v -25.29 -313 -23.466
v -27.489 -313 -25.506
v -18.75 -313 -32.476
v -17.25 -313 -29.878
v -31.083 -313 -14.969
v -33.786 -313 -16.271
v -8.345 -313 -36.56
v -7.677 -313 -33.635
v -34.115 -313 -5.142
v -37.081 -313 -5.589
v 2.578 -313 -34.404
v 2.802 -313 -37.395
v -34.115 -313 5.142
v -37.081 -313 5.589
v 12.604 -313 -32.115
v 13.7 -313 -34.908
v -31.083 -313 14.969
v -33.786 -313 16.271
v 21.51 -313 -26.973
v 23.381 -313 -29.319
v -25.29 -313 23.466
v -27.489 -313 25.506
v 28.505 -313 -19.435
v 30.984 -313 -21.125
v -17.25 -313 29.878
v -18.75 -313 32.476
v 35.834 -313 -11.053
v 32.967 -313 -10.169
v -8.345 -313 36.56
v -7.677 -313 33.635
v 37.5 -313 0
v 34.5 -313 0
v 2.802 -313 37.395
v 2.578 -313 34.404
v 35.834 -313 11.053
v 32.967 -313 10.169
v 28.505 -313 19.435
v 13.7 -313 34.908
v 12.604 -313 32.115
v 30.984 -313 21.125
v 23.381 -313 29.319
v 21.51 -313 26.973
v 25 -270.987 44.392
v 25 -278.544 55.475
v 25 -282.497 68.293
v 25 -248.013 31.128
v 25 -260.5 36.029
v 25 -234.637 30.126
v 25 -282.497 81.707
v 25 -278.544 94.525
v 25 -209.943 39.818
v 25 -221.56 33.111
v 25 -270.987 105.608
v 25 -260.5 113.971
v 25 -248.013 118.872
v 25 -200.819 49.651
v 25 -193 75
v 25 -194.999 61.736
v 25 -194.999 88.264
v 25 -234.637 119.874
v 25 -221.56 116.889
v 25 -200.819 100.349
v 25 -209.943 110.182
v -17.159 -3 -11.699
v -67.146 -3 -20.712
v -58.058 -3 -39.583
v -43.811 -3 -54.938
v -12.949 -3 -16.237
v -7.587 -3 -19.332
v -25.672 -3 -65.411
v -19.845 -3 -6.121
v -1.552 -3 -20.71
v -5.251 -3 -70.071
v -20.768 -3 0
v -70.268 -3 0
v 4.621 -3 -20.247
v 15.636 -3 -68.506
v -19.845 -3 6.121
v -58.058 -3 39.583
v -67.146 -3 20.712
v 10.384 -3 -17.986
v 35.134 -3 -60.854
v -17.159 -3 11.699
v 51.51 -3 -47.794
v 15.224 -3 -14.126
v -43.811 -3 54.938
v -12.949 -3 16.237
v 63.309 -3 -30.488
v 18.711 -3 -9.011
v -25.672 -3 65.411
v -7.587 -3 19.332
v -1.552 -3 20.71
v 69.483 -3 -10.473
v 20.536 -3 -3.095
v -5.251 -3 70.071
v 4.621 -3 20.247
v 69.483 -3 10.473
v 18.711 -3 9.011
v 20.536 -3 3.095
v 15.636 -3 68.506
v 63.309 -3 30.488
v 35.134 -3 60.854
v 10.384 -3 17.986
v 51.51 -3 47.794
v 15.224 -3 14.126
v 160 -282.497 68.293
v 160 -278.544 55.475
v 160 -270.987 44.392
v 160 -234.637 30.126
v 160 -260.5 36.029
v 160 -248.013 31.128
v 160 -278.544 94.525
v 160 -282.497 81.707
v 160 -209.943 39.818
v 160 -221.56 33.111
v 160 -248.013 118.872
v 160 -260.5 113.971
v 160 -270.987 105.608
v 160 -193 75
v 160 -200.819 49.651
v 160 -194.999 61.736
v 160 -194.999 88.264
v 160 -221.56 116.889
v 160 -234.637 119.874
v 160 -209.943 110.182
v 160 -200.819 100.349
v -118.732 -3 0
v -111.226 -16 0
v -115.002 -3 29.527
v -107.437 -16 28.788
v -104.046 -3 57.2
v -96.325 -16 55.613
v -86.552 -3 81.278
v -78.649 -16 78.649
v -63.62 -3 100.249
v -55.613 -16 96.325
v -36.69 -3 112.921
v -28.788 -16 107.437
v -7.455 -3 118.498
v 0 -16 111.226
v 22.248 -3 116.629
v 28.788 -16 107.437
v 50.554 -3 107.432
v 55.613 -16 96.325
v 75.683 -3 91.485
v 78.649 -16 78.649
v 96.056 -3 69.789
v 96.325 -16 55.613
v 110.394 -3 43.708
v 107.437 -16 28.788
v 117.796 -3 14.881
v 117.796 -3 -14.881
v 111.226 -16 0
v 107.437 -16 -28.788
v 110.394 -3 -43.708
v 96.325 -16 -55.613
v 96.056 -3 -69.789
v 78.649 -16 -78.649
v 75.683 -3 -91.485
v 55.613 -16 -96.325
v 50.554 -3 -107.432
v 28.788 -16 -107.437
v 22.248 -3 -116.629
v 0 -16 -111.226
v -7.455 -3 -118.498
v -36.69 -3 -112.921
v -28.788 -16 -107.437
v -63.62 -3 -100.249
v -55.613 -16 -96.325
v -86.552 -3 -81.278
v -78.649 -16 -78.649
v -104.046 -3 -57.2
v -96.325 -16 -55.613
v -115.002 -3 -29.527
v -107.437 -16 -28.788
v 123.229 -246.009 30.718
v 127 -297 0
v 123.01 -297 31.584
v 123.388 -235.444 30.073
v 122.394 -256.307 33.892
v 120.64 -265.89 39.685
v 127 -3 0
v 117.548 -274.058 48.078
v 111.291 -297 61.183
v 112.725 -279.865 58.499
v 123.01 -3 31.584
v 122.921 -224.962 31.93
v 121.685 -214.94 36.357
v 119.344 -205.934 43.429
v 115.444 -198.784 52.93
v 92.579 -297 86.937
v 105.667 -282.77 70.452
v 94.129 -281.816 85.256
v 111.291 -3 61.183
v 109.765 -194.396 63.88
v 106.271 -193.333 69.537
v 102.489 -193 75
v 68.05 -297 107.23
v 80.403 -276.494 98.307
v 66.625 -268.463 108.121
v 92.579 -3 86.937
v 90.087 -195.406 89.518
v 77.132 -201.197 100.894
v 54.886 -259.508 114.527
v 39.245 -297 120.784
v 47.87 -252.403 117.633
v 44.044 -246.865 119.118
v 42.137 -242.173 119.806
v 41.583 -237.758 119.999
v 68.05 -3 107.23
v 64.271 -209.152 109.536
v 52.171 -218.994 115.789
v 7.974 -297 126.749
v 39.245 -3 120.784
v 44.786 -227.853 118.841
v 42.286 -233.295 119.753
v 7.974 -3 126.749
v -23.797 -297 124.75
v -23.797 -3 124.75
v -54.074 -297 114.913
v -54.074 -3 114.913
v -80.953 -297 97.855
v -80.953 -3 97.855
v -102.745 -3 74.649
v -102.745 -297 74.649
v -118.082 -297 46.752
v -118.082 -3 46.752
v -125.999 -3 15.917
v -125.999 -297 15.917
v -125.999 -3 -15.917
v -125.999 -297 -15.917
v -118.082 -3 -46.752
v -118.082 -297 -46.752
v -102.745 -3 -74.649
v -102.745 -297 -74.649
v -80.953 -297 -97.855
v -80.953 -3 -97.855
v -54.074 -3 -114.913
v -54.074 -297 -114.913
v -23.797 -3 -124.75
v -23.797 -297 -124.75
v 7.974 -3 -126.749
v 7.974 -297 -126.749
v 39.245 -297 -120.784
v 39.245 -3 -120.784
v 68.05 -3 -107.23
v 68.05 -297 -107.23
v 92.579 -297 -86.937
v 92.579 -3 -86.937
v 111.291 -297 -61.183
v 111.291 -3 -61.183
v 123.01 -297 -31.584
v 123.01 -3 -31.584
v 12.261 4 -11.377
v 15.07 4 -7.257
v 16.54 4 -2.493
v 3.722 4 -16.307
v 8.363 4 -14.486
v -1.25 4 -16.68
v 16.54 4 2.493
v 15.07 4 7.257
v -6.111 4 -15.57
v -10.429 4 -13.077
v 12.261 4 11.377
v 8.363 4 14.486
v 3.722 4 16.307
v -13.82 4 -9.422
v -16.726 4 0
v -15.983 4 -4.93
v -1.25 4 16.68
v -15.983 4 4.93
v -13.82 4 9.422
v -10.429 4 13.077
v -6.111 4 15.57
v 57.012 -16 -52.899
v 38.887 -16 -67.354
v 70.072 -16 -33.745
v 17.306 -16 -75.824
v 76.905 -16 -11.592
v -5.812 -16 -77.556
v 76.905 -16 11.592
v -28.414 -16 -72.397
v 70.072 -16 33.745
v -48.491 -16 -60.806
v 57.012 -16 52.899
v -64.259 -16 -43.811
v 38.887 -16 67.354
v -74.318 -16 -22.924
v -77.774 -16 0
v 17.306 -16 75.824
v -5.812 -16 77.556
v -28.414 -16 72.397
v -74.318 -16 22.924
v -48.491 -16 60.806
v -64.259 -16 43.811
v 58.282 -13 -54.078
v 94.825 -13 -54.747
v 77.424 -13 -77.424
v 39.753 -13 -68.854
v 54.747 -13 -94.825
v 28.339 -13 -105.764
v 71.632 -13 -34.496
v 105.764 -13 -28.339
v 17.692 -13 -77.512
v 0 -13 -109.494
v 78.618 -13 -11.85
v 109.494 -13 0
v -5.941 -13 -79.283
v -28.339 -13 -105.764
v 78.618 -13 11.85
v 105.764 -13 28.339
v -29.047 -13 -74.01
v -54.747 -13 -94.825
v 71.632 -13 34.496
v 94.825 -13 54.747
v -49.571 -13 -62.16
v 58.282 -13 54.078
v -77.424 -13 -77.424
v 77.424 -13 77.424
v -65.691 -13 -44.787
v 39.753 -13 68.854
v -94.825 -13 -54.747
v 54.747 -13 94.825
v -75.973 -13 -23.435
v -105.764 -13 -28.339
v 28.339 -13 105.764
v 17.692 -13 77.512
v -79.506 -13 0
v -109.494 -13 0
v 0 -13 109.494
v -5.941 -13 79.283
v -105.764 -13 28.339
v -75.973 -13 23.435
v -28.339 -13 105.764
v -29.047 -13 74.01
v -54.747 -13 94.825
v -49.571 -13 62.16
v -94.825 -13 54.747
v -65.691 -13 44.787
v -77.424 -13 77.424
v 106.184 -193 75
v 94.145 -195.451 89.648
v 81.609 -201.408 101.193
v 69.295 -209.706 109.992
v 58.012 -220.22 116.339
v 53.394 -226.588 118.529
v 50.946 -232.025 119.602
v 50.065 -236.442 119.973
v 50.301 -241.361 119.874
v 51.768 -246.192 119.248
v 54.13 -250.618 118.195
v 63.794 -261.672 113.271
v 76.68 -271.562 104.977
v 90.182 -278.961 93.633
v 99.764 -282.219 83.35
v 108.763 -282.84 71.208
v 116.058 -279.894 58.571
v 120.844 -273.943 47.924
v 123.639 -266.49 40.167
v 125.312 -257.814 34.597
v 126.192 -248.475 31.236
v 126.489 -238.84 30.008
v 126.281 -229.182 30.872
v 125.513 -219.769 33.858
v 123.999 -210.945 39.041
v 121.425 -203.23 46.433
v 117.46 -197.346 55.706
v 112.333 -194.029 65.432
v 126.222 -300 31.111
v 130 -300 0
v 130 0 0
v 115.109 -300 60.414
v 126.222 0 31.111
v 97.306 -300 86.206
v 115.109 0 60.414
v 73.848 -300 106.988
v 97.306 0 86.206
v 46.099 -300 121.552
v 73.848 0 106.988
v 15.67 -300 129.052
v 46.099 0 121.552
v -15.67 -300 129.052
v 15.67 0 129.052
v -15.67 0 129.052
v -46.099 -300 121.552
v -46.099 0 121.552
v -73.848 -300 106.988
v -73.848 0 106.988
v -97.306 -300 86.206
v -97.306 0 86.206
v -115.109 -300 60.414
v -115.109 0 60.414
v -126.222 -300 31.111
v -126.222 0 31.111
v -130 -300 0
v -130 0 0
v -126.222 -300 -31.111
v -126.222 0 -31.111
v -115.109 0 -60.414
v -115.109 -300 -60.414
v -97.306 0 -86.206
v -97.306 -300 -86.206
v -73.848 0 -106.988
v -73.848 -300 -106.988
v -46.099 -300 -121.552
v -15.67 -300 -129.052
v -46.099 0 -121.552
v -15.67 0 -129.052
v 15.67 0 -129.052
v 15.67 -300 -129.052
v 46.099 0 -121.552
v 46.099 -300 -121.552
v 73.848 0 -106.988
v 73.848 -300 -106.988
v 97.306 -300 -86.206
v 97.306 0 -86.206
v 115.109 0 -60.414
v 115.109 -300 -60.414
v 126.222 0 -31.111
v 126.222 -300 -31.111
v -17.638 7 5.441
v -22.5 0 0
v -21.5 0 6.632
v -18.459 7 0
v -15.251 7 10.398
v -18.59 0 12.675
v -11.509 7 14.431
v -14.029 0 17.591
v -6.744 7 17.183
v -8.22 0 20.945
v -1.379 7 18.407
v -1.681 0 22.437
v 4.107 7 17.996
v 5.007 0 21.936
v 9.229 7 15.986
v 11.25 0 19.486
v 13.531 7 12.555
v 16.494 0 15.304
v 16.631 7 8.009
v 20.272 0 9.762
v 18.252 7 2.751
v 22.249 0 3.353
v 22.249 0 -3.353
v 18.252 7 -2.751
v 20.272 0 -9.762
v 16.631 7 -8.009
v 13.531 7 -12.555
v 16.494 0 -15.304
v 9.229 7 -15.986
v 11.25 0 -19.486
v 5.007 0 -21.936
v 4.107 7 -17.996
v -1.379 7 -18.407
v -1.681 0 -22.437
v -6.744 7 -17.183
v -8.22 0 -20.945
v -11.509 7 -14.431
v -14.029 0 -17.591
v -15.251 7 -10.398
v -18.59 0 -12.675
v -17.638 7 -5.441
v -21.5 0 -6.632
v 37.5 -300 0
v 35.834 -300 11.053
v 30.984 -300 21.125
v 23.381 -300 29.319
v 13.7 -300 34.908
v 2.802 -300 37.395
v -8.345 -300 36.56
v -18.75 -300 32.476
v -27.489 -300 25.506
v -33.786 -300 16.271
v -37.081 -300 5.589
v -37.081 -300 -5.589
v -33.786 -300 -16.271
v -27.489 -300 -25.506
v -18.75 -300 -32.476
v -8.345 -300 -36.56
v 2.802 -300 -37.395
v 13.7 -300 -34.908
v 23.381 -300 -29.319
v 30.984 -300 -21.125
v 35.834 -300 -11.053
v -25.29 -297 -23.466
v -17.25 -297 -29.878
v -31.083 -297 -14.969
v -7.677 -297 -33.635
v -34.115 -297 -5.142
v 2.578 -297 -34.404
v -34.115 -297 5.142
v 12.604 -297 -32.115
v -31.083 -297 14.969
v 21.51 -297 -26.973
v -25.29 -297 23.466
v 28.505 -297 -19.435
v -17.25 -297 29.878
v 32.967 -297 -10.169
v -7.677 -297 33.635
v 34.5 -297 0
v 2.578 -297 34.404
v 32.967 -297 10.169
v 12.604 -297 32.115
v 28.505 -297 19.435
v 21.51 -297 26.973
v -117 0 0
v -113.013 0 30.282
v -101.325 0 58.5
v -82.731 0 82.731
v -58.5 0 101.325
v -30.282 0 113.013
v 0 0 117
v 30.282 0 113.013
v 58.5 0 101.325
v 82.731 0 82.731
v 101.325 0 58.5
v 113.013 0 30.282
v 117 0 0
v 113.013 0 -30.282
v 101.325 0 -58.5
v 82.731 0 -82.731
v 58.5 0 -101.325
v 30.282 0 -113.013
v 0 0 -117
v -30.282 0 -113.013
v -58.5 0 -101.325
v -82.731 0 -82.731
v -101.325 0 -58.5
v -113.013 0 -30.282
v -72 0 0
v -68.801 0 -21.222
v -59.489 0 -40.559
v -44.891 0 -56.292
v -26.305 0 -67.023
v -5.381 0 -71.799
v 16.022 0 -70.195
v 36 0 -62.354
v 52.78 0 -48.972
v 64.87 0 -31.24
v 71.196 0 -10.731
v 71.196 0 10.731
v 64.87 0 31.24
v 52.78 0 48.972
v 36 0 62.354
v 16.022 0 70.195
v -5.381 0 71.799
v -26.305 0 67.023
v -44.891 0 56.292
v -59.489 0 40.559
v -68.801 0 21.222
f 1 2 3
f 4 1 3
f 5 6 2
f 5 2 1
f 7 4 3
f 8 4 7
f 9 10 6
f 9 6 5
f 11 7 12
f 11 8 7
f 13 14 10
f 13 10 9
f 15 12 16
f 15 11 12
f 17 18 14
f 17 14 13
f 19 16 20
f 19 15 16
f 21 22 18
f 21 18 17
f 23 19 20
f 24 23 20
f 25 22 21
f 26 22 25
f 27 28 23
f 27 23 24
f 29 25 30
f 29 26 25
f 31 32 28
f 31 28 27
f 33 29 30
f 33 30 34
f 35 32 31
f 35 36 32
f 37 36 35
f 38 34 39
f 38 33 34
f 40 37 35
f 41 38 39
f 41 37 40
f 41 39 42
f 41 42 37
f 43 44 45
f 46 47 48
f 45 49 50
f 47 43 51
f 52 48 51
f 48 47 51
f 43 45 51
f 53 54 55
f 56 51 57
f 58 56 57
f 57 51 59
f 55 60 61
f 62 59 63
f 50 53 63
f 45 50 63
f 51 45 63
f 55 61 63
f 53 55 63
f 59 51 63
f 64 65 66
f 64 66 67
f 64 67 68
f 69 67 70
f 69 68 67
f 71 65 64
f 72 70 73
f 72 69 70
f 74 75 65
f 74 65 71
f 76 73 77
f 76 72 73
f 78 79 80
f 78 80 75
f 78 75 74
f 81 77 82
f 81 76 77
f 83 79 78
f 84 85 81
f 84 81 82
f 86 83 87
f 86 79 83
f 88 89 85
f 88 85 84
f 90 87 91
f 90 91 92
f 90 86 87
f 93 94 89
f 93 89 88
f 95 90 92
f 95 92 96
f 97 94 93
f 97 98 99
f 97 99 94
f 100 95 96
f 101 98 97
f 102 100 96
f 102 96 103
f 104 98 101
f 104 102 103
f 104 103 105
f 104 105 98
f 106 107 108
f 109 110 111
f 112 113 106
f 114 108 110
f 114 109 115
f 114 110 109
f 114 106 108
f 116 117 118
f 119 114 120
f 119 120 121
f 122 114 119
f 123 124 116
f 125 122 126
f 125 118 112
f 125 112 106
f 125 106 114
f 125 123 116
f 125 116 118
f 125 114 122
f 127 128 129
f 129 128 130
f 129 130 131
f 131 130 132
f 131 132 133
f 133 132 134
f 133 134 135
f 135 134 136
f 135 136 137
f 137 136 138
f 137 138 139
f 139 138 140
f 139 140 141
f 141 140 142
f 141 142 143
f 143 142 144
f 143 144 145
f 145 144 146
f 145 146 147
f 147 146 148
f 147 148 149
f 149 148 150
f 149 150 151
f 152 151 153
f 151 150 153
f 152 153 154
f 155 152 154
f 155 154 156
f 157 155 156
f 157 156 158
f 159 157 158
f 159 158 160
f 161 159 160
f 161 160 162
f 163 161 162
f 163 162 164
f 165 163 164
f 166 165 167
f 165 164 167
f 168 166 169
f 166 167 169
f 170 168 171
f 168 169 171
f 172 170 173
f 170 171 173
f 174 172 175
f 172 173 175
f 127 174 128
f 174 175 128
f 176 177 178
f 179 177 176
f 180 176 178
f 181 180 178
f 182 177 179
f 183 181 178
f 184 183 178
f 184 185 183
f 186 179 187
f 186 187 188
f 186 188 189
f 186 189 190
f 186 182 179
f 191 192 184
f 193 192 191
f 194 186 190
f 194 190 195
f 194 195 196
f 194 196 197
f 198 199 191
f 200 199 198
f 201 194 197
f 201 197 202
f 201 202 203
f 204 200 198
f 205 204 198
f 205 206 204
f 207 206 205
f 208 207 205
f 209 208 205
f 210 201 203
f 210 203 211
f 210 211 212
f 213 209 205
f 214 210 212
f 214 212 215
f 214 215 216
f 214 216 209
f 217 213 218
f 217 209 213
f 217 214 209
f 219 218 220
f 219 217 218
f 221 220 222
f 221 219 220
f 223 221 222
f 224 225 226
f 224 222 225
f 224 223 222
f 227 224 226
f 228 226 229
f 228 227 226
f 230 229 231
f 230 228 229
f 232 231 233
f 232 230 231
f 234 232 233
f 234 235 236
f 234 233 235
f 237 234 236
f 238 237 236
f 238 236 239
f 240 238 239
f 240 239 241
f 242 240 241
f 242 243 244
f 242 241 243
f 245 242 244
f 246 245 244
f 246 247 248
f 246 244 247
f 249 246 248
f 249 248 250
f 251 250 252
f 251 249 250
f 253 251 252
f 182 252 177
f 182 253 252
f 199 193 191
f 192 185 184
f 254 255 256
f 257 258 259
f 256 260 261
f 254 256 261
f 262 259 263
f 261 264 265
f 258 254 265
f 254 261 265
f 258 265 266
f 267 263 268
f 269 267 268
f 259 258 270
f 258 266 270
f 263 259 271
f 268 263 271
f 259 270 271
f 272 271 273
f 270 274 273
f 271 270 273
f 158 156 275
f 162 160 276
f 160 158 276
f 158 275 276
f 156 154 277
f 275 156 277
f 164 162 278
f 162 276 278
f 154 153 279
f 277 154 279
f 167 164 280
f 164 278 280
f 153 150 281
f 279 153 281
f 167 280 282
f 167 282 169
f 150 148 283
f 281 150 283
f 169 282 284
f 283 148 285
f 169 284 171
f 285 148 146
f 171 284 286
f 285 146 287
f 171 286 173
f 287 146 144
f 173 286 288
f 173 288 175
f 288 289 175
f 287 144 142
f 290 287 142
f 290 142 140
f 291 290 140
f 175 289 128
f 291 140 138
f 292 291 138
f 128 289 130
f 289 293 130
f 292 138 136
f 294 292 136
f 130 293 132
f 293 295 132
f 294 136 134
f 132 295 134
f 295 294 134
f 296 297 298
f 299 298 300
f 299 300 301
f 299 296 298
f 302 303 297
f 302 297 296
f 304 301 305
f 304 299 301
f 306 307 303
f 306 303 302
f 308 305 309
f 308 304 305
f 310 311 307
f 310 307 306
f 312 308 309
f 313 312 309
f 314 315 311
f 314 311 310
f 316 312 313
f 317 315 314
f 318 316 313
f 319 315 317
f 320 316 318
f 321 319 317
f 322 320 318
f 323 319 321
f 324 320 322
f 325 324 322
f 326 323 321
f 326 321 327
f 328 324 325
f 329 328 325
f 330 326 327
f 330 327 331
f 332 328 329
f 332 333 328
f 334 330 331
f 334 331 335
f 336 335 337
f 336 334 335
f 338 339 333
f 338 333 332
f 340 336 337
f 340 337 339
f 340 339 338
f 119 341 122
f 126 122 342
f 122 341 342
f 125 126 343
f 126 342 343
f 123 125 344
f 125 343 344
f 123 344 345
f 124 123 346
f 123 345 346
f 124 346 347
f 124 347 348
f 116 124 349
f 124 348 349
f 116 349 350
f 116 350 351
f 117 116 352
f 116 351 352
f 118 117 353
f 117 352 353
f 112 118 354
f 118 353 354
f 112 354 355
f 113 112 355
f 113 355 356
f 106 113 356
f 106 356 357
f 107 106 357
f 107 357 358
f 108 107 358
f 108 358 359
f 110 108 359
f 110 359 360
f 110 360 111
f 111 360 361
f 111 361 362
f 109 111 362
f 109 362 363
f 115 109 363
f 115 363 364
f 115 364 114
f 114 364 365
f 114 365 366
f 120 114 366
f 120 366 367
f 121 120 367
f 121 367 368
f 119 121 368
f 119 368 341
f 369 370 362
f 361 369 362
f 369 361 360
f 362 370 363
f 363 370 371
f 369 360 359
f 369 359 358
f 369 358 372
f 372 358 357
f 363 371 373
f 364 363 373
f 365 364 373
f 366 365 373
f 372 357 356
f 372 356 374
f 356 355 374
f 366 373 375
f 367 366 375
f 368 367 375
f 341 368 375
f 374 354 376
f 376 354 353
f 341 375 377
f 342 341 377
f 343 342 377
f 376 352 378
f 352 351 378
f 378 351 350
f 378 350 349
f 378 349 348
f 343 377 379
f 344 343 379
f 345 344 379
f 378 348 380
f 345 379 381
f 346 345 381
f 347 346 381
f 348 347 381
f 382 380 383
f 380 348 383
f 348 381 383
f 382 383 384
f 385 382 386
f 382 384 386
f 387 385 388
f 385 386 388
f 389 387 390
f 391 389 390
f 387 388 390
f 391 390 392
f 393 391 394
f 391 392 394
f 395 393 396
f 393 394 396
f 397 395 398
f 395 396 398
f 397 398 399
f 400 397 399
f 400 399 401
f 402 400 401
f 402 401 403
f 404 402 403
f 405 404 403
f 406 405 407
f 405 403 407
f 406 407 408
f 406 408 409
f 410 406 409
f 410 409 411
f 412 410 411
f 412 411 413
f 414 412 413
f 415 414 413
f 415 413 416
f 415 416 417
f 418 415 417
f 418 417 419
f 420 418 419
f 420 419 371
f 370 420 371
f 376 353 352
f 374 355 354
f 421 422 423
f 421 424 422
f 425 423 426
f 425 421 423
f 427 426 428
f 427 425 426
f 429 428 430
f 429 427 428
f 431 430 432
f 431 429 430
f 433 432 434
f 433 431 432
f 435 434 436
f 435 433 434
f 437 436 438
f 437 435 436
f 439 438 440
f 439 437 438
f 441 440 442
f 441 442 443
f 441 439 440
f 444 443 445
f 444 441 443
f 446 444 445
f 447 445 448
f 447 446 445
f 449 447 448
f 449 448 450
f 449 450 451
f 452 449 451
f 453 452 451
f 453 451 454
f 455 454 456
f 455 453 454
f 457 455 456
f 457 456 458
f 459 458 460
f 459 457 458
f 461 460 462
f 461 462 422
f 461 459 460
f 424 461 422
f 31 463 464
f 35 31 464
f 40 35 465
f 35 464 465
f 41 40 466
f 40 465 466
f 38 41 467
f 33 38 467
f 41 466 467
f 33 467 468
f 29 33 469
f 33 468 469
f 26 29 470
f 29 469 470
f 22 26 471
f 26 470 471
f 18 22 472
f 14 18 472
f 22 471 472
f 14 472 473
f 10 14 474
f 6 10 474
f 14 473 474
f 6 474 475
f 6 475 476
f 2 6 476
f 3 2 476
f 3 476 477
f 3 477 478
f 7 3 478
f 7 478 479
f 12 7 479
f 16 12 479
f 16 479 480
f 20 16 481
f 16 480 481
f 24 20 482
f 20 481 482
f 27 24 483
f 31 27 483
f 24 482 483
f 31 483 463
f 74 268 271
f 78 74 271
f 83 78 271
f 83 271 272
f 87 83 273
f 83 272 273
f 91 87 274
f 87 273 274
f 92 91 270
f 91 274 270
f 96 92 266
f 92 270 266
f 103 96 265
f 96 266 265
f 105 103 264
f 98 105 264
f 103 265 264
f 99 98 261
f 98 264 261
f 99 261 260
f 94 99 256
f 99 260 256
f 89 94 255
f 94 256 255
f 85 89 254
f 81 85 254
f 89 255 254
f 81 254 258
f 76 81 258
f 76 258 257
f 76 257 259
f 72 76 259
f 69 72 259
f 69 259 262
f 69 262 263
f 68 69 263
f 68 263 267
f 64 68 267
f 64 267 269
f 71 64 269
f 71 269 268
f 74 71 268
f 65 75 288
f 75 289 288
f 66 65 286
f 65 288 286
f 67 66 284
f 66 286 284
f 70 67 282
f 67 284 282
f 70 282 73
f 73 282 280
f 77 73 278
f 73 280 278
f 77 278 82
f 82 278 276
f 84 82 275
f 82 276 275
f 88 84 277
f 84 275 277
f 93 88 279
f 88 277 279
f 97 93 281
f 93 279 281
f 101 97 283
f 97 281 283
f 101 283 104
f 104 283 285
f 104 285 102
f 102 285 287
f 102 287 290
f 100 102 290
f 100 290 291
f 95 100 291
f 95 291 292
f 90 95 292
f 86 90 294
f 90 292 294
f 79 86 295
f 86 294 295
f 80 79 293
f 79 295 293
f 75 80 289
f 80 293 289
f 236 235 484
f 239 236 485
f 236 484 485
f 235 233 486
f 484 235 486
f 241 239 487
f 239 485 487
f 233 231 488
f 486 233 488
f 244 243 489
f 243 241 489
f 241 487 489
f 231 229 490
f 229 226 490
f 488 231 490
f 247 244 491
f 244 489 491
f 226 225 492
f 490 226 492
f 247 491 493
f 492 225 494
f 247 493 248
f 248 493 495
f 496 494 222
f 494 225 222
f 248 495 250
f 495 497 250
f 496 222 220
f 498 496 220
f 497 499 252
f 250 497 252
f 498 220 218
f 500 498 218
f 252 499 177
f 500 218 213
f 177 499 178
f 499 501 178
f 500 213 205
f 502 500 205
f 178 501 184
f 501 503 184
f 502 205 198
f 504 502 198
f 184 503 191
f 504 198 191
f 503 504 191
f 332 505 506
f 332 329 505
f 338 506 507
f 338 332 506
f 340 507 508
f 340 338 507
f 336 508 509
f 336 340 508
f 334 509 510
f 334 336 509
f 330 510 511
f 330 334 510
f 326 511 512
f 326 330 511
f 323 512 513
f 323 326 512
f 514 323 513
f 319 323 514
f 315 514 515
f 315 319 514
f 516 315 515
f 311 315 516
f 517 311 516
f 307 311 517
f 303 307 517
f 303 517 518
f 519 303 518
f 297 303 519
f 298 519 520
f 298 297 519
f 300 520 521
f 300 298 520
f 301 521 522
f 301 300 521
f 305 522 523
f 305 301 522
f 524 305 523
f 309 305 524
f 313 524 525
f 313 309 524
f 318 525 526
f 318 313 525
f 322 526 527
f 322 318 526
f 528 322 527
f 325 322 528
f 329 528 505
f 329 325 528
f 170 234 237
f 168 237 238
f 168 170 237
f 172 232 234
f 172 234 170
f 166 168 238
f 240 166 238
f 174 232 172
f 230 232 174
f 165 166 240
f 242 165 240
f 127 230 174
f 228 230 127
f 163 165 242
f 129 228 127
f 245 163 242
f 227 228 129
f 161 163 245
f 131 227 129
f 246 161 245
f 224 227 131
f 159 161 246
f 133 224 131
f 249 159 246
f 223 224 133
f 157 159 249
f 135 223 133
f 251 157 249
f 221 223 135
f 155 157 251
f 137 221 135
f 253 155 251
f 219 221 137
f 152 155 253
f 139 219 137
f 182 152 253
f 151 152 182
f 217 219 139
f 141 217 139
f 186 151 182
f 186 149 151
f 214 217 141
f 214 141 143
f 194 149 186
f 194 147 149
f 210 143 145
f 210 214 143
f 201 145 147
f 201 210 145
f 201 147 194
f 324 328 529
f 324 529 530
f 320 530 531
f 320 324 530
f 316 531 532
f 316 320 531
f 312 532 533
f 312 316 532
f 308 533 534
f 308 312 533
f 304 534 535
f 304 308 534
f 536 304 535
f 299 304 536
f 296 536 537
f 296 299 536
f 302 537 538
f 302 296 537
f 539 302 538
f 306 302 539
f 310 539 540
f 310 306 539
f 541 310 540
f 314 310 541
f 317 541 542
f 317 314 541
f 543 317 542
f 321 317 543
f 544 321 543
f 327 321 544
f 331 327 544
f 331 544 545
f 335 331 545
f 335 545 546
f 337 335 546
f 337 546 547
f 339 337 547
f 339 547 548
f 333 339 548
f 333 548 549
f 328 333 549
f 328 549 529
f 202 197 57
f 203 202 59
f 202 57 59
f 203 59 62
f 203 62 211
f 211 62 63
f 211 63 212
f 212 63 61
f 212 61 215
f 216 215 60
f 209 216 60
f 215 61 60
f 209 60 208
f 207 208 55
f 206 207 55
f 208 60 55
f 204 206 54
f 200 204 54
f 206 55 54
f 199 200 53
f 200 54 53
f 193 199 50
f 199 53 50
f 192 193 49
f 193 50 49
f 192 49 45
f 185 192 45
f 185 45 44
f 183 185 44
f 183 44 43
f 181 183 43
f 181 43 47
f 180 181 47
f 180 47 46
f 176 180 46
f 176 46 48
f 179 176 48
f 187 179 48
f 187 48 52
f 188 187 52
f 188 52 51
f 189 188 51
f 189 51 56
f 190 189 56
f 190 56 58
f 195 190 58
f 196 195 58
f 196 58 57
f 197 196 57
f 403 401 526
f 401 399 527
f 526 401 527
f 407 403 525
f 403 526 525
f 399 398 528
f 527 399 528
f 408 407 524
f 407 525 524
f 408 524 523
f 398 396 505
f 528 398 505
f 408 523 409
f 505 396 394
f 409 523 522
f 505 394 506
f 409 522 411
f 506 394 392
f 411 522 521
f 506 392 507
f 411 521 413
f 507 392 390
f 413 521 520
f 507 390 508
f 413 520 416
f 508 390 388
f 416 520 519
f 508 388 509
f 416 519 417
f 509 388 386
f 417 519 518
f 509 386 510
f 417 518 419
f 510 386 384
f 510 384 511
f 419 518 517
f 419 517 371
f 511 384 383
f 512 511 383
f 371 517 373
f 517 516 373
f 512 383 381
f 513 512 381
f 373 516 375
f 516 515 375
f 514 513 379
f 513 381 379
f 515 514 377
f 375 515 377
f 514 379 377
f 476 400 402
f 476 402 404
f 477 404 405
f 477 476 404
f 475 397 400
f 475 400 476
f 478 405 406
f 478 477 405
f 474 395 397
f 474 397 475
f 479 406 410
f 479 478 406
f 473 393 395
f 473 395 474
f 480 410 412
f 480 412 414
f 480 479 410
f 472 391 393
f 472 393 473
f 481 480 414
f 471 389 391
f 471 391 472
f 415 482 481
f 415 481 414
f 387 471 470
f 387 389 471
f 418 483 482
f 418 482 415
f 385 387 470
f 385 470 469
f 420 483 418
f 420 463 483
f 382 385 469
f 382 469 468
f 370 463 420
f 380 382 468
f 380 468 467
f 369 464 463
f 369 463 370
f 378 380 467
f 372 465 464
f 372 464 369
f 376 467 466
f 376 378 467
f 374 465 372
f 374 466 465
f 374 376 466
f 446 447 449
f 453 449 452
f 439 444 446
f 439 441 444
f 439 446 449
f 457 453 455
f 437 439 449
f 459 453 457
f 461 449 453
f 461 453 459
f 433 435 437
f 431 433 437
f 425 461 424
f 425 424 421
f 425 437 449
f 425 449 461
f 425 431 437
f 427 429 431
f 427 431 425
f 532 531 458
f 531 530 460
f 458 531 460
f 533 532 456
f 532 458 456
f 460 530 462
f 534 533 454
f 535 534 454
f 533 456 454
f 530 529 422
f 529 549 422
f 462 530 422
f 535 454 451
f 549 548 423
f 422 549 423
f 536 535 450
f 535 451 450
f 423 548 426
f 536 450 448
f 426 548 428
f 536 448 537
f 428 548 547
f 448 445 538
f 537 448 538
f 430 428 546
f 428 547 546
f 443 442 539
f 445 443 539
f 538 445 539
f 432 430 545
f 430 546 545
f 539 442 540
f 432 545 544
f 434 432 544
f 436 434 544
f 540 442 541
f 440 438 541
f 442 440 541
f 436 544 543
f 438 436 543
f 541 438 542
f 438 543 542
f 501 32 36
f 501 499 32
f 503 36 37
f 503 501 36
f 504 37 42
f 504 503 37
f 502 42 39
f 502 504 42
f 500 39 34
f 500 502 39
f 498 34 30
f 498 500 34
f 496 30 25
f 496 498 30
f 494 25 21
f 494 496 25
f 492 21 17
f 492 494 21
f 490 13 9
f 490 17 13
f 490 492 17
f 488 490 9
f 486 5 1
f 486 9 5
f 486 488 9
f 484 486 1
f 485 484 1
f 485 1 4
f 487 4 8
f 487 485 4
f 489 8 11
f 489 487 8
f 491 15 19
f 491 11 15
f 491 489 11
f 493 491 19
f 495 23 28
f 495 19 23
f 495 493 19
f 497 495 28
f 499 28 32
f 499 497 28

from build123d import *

# Parameters (mm, degrees)
F0_R      = 130
F1_DEPTH  = 300
F2_R      = 37.5
F3_DEPTH  = 13
F4_R      = 117
F4_R_2    = 72
F5_DEPTH  = 13
F5_TAPER  = 30
F6_R      = 22.5
F7_DEPTH  = 7
F7_TAPER  = 30
F8_T      = -3
F10_START = 25
F9_R      = 45
F10_DEPTH = 135


with BuildPart() as f1:
    # F0 (on Front) → F1 (new body)
    with BuildSketch(Plane.XZ):
        Circle(F0_R)
    extrude(amount=F1_DEPTH)

    # F2 (on face) → F3 (join)
    with BuildSketch(Plane.XZ.offset(300)):
        Circle(F2_R)
    extrude(amount=F3_DEPTH)

    # F4 (on face) → F5 (cut)
    with BuildSketch(Plane(origin=(0, 0, 0), x_dir=(-1, 0, 0), z_dir=(0, 1, 0))):
        Circle(F4_R)
        Circle(F4_R_2, mode=Mode.SUBTRACT)
    extrude(amount=-F5_DEPTH, taper=F5_TAPER, mode=Mode.SUBTRACT)

    # F6 (on face) → F7 (join)
    with BuildSketch(Plane(origin=(0, 0, 0), x_dir=(-1, 0, 0), z_dir=(0, 1, 0))):
        Circle(F6_R)
    extrude(amount=F7_DEPTH, taper=F7_TAPER)

    # F8
    f8_openings = [f1.faces().sort_by_distance(p)[0] for p in [
        (0, -313, 0),
    ]]
    offset(amount=F8_T, openings=f8_openings, kind=Kind.INTERSECTION)

    # F9 (on Right) → F10 (join)
    with BuildSketch(Plane.YZ.offset(F10_START)):
        with Locations((-238, 75)):
            Circle(F9_R)
    extrude(amount=F10_DEPTH)


solid = f1.part
